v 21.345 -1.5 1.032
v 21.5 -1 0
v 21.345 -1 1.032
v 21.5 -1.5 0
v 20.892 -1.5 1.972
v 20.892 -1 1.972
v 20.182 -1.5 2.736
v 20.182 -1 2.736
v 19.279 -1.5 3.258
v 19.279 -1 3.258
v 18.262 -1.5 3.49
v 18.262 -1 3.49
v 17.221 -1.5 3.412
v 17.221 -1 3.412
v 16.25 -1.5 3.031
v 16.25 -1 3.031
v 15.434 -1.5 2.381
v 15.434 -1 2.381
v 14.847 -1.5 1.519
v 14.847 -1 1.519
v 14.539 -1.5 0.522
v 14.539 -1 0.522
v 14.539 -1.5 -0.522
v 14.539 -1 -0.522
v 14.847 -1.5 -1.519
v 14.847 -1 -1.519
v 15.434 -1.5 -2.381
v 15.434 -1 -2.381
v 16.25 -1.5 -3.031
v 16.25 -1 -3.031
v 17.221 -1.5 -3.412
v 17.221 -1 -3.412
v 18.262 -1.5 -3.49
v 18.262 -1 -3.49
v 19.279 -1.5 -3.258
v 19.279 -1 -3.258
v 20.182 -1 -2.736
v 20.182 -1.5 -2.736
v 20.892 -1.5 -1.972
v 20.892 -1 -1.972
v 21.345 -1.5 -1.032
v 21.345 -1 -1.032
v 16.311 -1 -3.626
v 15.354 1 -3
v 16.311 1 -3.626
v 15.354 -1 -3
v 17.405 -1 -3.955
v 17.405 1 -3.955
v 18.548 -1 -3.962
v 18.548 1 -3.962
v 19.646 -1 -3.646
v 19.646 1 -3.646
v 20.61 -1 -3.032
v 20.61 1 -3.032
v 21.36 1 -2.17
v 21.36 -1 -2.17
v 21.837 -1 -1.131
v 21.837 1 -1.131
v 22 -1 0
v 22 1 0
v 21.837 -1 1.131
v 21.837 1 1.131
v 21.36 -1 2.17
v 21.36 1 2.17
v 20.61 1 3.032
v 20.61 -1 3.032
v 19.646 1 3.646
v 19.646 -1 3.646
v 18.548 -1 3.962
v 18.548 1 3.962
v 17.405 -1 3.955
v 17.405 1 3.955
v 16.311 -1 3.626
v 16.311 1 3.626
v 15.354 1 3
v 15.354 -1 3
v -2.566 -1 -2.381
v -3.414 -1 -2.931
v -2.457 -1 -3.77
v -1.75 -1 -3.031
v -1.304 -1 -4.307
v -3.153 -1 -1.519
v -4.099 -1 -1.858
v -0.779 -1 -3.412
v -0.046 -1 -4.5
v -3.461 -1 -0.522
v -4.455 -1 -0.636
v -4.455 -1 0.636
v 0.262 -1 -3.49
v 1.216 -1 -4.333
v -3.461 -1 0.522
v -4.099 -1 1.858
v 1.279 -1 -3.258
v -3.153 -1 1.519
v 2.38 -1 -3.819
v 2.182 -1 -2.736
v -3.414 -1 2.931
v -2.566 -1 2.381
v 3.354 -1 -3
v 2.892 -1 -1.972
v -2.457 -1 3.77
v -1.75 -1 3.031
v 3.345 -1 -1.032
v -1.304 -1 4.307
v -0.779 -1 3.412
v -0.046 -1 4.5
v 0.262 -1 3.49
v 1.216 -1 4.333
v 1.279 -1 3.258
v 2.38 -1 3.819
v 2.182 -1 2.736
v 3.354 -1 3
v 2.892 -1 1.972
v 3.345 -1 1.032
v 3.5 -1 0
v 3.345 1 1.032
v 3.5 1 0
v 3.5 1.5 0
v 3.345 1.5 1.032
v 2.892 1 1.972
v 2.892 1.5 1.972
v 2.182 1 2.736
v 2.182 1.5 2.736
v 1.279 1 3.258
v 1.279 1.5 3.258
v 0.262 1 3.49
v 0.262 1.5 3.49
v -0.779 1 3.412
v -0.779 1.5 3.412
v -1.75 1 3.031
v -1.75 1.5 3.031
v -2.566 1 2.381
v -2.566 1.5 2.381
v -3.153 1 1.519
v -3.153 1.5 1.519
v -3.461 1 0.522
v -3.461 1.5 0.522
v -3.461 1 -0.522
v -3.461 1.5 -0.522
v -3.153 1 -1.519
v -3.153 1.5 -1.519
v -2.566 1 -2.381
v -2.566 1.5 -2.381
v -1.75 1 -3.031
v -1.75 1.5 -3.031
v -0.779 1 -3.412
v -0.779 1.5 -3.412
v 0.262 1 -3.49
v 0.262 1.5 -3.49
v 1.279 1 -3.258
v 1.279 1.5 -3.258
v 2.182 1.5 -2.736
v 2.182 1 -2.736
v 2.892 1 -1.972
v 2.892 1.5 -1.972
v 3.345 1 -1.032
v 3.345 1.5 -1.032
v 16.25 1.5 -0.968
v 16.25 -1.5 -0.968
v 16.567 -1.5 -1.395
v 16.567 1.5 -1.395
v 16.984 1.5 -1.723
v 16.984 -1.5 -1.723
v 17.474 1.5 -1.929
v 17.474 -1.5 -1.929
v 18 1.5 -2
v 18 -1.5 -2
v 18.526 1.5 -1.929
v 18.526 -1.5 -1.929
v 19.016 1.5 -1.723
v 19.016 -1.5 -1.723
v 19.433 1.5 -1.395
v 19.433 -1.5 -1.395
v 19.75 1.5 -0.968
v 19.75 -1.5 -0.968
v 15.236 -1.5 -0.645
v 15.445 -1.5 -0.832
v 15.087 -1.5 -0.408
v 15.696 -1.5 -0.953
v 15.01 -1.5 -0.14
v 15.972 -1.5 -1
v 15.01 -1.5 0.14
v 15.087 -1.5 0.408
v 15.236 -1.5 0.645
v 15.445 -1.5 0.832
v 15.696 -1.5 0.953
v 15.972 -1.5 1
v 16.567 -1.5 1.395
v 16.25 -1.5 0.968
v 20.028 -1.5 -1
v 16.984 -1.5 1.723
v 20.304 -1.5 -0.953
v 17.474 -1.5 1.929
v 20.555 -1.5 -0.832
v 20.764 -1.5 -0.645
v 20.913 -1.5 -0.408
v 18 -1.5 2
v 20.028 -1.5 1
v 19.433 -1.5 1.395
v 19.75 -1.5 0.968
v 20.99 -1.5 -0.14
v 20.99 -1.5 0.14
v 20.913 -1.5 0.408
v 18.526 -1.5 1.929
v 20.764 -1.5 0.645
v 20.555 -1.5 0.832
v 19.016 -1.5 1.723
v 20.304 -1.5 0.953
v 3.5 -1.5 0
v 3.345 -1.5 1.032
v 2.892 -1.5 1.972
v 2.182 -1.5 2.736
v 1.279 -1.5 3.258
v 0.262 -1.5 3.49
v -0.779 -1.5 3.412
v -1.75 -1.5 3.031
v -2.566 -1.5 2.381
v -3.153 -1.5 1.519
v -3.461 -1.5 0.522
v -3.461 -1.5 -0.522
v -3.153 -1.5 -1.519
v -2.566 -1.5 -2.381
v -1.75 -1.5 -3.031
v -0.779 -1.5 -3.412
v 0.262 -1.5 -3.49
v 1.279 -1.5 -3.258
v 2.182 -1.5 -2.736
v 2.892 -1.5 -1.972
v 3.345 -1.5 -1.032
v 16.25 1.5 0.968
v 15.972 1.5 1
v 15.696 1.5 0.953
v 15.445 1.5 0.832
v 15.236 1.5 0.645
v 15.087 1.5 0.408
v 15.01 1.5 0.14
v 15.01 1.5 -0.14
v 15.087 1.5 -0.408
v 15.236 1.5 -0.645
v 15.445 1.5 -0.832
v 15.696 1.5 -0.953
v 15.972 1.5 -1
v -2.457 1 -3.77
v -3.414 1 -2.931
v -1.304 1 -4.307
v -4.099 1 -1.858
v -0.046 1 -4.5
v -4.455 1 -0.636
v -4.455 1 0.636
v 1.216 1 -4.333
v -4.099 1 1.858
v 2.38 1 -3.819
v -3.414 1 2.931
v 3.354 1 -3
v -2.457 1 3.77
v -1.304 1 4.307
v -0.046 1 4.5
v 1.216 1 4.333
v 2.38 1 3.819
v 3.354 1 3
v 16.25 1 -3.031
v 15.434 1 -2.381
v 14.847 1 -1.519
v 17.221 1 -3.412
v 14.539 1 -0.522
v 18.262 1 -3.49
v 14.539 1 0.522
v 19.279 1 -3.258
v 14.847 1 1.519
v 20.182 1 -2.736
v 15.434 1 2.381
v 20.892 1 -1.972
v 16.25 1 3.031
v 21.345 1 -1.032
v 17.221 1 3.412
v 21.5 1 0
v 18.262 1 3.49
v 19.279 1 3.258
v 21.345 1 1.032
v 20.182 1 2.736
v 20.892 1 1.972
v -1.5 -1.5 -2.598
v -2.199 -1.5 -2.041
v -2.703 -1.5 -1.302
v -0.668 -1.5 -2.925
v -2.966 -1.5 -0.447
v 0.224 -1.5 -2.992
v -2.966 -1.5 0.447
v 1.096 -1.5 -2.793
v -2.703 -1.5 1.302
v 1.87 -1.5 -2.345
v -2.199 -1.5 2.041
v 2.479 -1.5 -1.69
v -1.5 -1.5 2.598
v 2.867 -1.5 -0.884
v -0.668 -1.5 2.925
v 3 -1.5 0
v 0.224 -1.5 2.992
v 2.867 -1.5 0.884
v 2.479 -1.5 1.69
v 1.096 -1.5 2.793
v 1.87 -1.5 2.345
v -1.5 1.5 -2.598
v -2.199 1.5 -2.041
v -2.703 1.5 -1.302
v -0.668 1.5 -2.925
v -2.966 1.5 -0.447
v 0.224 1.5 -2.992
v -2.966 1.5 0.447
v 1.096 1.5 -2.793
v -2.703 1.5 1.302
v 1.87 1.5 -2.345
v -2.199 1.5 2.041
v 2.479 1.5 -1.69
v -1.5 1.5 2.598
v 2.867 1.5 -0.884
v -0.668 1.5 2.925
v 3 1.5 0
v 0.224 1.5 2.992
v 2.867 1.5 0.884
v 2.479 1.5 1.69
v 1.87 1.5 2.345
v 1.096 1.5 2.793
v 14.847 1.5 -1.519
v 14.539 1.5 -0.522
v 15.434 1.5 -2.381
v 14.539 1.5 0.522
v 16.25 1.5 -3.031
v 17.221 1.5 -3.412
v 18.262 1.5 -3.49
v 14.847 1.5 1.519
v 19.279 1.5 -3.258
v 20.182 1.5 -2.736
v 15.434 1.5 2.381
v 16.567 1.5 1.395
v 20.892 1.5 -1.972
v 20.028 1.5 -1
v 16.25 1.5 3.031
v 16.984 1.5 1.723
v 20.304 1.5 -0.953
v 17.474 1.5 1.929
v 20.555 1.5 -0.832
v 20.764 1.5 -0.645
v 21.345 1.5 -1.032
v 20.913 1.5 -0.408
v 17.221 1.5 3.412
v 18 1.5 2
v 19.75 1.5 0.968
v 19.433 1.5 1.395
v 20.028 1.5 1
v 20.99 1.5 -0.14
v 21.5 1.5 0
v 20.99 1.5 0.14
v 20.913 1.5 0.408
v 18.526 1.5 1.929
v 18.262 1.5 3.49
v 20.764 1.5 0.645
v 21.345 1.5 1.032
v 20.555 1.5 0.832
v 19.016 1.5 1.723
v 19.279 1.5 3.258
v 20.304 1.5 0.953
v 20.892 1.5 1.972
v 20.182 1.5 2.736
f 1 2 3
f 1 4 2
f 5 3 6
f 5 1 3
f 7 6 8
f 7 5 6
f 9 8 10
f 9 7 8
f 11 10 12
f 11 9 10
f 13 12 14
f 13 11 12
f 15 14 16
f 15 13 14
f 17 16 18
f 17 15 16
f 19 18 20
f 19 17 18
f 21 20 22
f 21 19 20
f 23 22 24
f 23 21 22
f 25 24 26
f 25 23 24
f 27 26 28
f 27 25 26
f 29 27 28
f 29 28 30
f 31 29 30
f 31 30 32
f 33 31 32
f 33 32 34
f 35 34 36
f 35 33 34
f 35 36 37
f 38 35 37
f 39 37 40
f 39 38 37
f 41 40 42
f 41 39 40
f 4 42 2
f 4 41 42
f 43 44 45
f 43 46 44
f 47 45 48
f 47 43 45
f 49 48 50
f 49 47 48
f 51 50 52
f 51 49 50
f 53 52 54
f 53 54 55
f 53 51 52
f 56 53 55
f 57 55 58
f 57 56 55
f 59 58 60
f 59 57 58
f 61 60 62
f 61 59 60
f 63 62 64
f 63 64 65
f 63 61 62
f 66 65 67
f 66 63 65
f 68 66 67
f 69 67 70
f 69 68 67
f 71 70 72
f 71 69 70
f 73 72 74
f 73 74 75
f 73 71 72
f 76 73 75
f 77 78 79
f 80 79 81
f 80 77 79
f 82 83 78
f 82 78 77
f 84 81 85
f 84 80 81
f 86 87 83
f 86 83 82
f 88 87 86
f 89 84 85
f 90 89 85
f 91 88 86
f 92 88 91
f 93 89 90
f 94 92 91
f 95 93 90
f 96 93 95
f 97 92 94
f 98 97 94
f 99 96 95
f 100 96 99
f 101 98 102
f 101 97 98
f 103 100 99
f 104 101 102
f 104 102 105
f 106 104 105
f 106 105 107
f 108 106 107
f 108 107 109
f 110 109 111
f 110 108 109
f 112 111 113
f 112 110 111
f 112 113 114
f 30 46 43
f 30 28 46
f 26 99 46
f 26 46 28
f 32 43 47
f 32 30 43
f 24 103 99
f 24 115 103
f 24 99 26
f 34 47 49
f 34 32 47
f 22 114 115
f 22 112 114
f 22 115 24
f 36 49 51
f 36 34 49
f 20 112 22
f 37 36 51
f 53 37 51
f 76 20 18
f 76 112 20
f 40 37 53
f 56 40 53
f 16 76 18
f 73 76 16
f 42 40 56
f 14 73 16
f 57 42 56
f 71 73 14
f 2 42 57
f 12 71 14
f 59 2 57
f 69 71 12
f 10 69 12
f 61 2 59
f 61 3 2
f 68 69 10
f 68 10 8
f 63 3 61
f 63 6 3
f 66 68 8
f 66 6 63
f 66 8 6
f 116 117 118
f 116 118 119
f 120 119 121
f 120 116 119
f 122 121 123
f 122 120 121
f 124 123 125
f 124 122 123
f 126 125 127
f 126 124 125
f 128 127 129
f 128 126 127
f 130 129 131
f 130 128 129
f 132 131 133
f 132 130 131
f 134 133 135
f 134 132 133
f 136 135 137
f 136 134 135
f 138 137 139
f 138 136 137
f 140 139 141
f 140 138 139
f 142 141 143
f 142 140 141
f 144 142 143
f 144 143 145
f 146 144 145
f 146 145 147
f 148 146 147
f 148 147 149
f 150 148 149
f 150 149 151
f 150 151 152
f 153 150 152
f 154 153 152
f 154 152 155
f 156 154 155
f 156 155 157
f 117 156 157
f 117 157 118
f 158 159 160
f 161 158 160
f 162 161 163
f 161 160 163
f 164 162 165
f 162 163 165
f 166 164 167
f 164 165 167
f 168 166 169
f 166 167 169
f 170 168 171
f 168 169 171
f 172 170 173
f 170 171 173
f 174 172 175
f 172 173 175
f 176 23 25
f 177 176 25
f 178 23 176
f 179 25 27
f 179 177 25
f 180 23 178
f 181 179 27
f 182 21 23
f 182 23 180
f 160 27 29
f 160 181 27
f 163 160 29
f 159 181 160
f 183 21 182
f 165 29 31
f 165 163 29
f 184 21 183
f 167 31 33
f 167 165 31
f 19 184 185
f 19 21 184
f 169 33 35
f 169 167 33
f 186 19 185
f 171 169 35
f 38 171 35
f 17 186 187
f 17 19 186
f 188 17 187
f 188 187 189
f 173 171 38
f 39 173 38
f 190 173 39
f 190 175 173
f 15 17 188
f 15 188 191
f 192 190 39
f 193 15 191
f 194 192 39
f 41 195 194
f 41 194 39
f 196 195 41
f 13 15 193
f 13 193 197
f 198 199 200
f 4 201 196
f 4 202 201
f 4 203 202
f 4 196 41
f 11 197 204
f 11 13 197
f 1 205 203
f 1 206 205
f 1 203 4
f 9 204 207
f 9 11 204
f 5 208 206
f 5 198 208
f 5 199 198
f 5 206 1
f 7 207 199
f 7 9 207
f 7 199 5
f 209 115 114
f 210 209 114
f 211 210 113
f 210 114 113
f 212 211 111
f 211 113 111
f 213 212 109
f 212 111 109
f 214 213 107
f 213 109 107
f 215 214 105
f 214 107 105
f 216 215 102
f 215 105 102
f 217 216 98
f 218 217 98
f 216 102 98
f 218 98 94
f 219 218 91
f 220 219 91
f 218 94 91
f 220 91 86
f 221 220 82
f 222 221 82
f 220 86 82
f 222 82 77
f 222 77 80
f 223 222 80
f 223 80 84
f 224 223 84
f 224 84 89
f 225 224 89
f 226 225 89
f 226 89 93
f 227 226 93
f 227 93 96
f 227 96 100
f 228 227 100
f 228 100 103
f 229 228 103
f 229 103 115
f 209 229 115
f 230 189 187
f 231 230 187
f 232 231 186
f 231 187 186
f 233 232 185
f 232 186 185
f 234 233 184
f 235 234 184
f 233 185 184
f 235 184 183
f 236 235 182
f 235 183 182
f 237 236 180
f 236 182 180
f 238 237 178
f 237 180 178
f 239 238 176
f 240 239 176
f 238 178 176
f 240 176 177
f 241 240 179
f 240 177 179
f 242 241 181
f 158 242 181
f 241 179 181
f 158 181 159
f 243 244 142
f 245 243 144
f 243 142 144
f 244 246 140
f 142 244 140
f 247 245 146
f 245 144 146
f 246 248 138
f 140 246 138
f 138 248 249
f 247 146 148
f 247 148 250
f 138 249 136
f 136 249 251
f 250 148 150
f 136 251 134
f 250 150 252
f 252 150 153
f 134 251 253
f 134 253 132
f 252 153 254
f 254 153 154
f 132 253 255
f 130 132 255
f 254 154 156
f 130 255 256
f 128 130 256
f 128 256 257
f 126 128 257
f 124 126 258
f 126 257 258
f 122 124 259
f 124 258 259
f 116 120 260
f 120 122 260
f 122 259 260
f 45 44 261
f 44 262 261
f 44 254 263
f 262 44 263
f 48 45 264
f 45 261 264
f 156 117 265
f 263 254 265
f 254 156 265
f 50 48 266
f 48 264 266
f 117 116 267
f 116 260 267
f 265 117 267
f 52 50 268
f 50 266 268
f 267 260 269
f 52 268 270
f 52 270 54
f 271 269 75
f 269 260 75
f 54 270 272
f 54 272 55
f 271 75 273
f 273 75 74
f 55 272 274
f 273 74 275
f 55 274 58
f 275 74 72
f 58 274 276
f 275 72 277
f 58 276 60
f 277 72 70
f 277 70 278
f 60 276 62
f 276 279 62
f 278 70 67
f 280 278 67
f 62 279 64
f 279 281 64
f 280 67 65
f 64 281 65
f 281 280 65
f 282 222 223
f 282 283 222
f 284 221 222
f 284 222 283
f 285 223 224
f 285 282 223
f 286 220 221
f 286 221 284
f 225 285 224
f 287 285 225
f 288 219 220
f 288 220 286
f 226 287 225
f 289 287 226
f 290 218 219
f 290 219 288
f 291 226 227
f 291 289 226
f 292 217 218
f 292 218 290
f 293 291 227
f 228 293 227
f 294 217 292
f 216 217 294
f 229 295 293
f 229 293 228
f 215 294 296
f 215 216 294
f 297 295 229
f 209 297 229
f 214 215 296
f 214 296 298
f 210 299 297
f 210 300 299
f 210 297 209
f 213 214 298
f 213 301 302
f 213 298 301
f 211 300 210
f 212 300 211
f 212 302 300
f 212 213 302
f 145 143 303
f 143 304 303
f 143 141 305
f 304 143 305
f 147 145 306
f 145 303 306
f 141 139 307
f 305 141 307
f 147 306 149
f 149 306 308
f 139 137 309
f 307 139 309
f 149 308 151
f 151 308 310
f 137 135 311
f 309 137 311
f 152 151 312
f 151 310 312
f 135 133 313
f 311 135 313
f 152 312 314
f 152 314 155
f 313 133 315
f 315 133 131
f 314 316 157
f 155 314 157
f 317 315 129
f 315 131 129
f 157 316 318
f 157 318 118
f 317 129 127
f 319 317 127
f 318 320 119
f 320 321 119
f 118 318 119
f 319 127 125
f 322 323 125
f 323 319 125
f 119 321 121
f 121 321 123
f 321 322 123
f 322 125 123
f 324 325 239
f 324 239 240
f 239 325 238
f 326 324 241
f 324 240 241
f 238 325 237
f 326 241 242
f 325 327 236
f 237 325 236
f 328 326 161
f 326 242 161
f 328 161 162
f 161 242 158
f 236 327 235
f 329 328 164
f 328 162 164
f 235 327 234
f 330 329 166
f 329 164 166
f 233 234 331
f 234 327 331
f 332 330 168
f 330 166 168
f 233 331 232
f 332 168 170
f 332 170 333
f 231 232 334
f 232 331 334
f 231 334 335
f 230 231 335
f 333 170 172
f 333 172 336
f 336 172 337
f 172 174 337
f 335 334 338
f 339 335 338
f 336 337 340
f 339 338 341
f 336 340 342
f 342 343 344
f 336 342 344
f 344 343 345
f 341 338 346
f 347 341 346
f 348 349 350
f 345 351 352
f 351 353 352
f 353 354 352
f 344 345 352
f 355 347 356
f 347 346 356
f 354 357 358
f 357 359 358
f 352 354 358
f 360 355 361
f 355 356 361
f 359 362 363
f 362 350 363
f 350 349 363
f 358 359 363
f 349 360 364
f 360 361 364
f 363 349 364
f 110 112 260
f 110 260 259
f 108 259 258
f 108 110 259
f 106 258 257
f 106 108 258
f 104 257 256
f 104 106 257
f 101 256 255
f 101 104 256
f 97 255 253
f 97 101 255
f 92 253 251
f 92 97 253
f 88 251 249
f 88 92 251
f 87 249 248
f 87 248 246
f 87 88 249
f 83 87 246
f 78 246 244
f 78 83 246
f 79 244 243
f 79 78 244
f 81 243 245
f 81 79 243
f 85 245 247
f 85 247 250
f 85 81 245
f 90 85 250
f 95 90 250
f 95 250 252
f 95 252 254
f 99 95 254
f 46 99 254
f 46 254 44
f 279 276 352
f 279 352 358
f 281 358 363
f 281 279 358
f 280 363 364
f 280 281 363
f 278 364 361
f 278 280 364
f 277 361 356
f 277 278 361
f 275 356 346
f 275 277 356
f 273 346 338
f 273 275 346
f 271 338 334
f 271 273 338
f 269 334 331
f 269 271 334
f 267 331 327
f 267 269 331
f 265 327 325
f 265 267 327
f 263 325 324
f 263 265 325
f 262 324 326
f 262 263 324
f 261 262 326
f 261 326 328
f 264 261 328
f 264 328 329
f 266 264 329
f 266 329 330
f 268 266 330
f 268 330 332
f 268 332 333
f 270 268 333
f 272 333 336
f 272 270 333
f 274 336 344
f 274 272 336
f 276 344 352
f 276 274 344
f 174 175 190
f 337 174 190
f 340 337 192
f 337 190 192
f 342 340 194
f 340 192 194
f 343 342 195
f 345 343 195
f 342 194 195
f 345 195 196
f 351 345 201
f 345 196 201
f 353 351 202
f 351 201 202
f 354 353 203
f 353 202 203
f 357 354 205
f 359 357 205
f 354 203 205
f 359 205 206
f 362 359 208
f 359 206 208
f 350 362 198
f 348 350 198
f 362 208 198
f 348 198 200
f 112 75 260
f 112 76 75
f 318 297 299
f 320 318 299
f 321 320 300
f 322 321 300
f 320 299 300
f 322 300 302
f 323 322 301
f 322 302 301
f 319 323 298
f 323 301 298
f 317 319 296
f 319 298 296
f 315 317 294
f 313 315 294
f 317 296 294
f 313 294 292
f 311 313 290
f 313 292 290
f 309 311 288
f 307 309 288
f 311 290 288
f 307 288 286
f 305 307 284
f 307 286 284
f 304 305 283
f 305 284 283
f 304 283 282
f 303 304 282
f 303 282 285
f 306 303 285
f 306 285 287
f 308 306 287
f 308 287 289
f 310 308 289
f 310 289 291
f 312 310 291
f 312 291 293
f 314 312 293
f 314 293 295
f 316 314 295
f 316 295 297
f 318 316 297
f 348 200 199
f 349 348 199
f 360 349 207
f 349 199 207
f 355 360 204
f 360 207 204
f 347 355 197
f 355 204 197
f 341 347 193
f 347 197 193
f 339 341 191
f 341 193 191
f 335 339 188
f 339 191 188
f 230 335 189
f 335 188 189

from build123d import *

# Parameters (mm, degrees)
F1_DEPTH = 1
F2_R     = 3.5
F3_DEPTH = 1.5
F4_R     = 3
F5_DEPTH = 3.001


with BuildPart() as f1:
    # F0 (on Front) → F1 (new body, symmetric)
    with BuildSketch(Plane.XZ):
        with BuildLine():
            Line((15.3542486889, 3), (3.3541019662, 3))
            ThreePointArc((3.3541019662, 3), (-4.5, 0), (3.3541019662, -3))
            Line((3.3541019662, -3), (15.3542486889, -3))
            ThreePointArc((15.3542486889, -3), (22, 0), (15.3542486889, 3))
        make_face()
    extrude(amount=F1_DEPTH, both=True)

    # F2 (on Front) → F3 (join, symmetric)
    with BuildSketch(Plane.XZ):
        Circle(F2_R)
        with Locations((18, 0)):
            Circle(F2_R)
    extrude(amount=F3_DEPTH, both=True)

    # F4 (on face) → F5 (cut, through all)
    with BuildSketch(Plane.XZ.offset(1.5)):
        Circle(F4_R)
        with BuildLine():
            ThreePointArc((19.75, -0.9682458366), (21, 0), (19.75, 0.9682458366))
            ThreePointArc((19.75, 0.9682458366), (18, 2), (16.25, 0.9682458366))
            ThreePointArc((16.25, 0.9682458366), (15, 0), (16.25, -0.9682458366))
            ThreePointArc((16.25, -0.9682458366), (18, -2), (19.75, -0.9682458366))
        make_face()
    extrude(amount=-F5_DEPTH, mode=Mode.SUBTRACT)


solid = f1.part
